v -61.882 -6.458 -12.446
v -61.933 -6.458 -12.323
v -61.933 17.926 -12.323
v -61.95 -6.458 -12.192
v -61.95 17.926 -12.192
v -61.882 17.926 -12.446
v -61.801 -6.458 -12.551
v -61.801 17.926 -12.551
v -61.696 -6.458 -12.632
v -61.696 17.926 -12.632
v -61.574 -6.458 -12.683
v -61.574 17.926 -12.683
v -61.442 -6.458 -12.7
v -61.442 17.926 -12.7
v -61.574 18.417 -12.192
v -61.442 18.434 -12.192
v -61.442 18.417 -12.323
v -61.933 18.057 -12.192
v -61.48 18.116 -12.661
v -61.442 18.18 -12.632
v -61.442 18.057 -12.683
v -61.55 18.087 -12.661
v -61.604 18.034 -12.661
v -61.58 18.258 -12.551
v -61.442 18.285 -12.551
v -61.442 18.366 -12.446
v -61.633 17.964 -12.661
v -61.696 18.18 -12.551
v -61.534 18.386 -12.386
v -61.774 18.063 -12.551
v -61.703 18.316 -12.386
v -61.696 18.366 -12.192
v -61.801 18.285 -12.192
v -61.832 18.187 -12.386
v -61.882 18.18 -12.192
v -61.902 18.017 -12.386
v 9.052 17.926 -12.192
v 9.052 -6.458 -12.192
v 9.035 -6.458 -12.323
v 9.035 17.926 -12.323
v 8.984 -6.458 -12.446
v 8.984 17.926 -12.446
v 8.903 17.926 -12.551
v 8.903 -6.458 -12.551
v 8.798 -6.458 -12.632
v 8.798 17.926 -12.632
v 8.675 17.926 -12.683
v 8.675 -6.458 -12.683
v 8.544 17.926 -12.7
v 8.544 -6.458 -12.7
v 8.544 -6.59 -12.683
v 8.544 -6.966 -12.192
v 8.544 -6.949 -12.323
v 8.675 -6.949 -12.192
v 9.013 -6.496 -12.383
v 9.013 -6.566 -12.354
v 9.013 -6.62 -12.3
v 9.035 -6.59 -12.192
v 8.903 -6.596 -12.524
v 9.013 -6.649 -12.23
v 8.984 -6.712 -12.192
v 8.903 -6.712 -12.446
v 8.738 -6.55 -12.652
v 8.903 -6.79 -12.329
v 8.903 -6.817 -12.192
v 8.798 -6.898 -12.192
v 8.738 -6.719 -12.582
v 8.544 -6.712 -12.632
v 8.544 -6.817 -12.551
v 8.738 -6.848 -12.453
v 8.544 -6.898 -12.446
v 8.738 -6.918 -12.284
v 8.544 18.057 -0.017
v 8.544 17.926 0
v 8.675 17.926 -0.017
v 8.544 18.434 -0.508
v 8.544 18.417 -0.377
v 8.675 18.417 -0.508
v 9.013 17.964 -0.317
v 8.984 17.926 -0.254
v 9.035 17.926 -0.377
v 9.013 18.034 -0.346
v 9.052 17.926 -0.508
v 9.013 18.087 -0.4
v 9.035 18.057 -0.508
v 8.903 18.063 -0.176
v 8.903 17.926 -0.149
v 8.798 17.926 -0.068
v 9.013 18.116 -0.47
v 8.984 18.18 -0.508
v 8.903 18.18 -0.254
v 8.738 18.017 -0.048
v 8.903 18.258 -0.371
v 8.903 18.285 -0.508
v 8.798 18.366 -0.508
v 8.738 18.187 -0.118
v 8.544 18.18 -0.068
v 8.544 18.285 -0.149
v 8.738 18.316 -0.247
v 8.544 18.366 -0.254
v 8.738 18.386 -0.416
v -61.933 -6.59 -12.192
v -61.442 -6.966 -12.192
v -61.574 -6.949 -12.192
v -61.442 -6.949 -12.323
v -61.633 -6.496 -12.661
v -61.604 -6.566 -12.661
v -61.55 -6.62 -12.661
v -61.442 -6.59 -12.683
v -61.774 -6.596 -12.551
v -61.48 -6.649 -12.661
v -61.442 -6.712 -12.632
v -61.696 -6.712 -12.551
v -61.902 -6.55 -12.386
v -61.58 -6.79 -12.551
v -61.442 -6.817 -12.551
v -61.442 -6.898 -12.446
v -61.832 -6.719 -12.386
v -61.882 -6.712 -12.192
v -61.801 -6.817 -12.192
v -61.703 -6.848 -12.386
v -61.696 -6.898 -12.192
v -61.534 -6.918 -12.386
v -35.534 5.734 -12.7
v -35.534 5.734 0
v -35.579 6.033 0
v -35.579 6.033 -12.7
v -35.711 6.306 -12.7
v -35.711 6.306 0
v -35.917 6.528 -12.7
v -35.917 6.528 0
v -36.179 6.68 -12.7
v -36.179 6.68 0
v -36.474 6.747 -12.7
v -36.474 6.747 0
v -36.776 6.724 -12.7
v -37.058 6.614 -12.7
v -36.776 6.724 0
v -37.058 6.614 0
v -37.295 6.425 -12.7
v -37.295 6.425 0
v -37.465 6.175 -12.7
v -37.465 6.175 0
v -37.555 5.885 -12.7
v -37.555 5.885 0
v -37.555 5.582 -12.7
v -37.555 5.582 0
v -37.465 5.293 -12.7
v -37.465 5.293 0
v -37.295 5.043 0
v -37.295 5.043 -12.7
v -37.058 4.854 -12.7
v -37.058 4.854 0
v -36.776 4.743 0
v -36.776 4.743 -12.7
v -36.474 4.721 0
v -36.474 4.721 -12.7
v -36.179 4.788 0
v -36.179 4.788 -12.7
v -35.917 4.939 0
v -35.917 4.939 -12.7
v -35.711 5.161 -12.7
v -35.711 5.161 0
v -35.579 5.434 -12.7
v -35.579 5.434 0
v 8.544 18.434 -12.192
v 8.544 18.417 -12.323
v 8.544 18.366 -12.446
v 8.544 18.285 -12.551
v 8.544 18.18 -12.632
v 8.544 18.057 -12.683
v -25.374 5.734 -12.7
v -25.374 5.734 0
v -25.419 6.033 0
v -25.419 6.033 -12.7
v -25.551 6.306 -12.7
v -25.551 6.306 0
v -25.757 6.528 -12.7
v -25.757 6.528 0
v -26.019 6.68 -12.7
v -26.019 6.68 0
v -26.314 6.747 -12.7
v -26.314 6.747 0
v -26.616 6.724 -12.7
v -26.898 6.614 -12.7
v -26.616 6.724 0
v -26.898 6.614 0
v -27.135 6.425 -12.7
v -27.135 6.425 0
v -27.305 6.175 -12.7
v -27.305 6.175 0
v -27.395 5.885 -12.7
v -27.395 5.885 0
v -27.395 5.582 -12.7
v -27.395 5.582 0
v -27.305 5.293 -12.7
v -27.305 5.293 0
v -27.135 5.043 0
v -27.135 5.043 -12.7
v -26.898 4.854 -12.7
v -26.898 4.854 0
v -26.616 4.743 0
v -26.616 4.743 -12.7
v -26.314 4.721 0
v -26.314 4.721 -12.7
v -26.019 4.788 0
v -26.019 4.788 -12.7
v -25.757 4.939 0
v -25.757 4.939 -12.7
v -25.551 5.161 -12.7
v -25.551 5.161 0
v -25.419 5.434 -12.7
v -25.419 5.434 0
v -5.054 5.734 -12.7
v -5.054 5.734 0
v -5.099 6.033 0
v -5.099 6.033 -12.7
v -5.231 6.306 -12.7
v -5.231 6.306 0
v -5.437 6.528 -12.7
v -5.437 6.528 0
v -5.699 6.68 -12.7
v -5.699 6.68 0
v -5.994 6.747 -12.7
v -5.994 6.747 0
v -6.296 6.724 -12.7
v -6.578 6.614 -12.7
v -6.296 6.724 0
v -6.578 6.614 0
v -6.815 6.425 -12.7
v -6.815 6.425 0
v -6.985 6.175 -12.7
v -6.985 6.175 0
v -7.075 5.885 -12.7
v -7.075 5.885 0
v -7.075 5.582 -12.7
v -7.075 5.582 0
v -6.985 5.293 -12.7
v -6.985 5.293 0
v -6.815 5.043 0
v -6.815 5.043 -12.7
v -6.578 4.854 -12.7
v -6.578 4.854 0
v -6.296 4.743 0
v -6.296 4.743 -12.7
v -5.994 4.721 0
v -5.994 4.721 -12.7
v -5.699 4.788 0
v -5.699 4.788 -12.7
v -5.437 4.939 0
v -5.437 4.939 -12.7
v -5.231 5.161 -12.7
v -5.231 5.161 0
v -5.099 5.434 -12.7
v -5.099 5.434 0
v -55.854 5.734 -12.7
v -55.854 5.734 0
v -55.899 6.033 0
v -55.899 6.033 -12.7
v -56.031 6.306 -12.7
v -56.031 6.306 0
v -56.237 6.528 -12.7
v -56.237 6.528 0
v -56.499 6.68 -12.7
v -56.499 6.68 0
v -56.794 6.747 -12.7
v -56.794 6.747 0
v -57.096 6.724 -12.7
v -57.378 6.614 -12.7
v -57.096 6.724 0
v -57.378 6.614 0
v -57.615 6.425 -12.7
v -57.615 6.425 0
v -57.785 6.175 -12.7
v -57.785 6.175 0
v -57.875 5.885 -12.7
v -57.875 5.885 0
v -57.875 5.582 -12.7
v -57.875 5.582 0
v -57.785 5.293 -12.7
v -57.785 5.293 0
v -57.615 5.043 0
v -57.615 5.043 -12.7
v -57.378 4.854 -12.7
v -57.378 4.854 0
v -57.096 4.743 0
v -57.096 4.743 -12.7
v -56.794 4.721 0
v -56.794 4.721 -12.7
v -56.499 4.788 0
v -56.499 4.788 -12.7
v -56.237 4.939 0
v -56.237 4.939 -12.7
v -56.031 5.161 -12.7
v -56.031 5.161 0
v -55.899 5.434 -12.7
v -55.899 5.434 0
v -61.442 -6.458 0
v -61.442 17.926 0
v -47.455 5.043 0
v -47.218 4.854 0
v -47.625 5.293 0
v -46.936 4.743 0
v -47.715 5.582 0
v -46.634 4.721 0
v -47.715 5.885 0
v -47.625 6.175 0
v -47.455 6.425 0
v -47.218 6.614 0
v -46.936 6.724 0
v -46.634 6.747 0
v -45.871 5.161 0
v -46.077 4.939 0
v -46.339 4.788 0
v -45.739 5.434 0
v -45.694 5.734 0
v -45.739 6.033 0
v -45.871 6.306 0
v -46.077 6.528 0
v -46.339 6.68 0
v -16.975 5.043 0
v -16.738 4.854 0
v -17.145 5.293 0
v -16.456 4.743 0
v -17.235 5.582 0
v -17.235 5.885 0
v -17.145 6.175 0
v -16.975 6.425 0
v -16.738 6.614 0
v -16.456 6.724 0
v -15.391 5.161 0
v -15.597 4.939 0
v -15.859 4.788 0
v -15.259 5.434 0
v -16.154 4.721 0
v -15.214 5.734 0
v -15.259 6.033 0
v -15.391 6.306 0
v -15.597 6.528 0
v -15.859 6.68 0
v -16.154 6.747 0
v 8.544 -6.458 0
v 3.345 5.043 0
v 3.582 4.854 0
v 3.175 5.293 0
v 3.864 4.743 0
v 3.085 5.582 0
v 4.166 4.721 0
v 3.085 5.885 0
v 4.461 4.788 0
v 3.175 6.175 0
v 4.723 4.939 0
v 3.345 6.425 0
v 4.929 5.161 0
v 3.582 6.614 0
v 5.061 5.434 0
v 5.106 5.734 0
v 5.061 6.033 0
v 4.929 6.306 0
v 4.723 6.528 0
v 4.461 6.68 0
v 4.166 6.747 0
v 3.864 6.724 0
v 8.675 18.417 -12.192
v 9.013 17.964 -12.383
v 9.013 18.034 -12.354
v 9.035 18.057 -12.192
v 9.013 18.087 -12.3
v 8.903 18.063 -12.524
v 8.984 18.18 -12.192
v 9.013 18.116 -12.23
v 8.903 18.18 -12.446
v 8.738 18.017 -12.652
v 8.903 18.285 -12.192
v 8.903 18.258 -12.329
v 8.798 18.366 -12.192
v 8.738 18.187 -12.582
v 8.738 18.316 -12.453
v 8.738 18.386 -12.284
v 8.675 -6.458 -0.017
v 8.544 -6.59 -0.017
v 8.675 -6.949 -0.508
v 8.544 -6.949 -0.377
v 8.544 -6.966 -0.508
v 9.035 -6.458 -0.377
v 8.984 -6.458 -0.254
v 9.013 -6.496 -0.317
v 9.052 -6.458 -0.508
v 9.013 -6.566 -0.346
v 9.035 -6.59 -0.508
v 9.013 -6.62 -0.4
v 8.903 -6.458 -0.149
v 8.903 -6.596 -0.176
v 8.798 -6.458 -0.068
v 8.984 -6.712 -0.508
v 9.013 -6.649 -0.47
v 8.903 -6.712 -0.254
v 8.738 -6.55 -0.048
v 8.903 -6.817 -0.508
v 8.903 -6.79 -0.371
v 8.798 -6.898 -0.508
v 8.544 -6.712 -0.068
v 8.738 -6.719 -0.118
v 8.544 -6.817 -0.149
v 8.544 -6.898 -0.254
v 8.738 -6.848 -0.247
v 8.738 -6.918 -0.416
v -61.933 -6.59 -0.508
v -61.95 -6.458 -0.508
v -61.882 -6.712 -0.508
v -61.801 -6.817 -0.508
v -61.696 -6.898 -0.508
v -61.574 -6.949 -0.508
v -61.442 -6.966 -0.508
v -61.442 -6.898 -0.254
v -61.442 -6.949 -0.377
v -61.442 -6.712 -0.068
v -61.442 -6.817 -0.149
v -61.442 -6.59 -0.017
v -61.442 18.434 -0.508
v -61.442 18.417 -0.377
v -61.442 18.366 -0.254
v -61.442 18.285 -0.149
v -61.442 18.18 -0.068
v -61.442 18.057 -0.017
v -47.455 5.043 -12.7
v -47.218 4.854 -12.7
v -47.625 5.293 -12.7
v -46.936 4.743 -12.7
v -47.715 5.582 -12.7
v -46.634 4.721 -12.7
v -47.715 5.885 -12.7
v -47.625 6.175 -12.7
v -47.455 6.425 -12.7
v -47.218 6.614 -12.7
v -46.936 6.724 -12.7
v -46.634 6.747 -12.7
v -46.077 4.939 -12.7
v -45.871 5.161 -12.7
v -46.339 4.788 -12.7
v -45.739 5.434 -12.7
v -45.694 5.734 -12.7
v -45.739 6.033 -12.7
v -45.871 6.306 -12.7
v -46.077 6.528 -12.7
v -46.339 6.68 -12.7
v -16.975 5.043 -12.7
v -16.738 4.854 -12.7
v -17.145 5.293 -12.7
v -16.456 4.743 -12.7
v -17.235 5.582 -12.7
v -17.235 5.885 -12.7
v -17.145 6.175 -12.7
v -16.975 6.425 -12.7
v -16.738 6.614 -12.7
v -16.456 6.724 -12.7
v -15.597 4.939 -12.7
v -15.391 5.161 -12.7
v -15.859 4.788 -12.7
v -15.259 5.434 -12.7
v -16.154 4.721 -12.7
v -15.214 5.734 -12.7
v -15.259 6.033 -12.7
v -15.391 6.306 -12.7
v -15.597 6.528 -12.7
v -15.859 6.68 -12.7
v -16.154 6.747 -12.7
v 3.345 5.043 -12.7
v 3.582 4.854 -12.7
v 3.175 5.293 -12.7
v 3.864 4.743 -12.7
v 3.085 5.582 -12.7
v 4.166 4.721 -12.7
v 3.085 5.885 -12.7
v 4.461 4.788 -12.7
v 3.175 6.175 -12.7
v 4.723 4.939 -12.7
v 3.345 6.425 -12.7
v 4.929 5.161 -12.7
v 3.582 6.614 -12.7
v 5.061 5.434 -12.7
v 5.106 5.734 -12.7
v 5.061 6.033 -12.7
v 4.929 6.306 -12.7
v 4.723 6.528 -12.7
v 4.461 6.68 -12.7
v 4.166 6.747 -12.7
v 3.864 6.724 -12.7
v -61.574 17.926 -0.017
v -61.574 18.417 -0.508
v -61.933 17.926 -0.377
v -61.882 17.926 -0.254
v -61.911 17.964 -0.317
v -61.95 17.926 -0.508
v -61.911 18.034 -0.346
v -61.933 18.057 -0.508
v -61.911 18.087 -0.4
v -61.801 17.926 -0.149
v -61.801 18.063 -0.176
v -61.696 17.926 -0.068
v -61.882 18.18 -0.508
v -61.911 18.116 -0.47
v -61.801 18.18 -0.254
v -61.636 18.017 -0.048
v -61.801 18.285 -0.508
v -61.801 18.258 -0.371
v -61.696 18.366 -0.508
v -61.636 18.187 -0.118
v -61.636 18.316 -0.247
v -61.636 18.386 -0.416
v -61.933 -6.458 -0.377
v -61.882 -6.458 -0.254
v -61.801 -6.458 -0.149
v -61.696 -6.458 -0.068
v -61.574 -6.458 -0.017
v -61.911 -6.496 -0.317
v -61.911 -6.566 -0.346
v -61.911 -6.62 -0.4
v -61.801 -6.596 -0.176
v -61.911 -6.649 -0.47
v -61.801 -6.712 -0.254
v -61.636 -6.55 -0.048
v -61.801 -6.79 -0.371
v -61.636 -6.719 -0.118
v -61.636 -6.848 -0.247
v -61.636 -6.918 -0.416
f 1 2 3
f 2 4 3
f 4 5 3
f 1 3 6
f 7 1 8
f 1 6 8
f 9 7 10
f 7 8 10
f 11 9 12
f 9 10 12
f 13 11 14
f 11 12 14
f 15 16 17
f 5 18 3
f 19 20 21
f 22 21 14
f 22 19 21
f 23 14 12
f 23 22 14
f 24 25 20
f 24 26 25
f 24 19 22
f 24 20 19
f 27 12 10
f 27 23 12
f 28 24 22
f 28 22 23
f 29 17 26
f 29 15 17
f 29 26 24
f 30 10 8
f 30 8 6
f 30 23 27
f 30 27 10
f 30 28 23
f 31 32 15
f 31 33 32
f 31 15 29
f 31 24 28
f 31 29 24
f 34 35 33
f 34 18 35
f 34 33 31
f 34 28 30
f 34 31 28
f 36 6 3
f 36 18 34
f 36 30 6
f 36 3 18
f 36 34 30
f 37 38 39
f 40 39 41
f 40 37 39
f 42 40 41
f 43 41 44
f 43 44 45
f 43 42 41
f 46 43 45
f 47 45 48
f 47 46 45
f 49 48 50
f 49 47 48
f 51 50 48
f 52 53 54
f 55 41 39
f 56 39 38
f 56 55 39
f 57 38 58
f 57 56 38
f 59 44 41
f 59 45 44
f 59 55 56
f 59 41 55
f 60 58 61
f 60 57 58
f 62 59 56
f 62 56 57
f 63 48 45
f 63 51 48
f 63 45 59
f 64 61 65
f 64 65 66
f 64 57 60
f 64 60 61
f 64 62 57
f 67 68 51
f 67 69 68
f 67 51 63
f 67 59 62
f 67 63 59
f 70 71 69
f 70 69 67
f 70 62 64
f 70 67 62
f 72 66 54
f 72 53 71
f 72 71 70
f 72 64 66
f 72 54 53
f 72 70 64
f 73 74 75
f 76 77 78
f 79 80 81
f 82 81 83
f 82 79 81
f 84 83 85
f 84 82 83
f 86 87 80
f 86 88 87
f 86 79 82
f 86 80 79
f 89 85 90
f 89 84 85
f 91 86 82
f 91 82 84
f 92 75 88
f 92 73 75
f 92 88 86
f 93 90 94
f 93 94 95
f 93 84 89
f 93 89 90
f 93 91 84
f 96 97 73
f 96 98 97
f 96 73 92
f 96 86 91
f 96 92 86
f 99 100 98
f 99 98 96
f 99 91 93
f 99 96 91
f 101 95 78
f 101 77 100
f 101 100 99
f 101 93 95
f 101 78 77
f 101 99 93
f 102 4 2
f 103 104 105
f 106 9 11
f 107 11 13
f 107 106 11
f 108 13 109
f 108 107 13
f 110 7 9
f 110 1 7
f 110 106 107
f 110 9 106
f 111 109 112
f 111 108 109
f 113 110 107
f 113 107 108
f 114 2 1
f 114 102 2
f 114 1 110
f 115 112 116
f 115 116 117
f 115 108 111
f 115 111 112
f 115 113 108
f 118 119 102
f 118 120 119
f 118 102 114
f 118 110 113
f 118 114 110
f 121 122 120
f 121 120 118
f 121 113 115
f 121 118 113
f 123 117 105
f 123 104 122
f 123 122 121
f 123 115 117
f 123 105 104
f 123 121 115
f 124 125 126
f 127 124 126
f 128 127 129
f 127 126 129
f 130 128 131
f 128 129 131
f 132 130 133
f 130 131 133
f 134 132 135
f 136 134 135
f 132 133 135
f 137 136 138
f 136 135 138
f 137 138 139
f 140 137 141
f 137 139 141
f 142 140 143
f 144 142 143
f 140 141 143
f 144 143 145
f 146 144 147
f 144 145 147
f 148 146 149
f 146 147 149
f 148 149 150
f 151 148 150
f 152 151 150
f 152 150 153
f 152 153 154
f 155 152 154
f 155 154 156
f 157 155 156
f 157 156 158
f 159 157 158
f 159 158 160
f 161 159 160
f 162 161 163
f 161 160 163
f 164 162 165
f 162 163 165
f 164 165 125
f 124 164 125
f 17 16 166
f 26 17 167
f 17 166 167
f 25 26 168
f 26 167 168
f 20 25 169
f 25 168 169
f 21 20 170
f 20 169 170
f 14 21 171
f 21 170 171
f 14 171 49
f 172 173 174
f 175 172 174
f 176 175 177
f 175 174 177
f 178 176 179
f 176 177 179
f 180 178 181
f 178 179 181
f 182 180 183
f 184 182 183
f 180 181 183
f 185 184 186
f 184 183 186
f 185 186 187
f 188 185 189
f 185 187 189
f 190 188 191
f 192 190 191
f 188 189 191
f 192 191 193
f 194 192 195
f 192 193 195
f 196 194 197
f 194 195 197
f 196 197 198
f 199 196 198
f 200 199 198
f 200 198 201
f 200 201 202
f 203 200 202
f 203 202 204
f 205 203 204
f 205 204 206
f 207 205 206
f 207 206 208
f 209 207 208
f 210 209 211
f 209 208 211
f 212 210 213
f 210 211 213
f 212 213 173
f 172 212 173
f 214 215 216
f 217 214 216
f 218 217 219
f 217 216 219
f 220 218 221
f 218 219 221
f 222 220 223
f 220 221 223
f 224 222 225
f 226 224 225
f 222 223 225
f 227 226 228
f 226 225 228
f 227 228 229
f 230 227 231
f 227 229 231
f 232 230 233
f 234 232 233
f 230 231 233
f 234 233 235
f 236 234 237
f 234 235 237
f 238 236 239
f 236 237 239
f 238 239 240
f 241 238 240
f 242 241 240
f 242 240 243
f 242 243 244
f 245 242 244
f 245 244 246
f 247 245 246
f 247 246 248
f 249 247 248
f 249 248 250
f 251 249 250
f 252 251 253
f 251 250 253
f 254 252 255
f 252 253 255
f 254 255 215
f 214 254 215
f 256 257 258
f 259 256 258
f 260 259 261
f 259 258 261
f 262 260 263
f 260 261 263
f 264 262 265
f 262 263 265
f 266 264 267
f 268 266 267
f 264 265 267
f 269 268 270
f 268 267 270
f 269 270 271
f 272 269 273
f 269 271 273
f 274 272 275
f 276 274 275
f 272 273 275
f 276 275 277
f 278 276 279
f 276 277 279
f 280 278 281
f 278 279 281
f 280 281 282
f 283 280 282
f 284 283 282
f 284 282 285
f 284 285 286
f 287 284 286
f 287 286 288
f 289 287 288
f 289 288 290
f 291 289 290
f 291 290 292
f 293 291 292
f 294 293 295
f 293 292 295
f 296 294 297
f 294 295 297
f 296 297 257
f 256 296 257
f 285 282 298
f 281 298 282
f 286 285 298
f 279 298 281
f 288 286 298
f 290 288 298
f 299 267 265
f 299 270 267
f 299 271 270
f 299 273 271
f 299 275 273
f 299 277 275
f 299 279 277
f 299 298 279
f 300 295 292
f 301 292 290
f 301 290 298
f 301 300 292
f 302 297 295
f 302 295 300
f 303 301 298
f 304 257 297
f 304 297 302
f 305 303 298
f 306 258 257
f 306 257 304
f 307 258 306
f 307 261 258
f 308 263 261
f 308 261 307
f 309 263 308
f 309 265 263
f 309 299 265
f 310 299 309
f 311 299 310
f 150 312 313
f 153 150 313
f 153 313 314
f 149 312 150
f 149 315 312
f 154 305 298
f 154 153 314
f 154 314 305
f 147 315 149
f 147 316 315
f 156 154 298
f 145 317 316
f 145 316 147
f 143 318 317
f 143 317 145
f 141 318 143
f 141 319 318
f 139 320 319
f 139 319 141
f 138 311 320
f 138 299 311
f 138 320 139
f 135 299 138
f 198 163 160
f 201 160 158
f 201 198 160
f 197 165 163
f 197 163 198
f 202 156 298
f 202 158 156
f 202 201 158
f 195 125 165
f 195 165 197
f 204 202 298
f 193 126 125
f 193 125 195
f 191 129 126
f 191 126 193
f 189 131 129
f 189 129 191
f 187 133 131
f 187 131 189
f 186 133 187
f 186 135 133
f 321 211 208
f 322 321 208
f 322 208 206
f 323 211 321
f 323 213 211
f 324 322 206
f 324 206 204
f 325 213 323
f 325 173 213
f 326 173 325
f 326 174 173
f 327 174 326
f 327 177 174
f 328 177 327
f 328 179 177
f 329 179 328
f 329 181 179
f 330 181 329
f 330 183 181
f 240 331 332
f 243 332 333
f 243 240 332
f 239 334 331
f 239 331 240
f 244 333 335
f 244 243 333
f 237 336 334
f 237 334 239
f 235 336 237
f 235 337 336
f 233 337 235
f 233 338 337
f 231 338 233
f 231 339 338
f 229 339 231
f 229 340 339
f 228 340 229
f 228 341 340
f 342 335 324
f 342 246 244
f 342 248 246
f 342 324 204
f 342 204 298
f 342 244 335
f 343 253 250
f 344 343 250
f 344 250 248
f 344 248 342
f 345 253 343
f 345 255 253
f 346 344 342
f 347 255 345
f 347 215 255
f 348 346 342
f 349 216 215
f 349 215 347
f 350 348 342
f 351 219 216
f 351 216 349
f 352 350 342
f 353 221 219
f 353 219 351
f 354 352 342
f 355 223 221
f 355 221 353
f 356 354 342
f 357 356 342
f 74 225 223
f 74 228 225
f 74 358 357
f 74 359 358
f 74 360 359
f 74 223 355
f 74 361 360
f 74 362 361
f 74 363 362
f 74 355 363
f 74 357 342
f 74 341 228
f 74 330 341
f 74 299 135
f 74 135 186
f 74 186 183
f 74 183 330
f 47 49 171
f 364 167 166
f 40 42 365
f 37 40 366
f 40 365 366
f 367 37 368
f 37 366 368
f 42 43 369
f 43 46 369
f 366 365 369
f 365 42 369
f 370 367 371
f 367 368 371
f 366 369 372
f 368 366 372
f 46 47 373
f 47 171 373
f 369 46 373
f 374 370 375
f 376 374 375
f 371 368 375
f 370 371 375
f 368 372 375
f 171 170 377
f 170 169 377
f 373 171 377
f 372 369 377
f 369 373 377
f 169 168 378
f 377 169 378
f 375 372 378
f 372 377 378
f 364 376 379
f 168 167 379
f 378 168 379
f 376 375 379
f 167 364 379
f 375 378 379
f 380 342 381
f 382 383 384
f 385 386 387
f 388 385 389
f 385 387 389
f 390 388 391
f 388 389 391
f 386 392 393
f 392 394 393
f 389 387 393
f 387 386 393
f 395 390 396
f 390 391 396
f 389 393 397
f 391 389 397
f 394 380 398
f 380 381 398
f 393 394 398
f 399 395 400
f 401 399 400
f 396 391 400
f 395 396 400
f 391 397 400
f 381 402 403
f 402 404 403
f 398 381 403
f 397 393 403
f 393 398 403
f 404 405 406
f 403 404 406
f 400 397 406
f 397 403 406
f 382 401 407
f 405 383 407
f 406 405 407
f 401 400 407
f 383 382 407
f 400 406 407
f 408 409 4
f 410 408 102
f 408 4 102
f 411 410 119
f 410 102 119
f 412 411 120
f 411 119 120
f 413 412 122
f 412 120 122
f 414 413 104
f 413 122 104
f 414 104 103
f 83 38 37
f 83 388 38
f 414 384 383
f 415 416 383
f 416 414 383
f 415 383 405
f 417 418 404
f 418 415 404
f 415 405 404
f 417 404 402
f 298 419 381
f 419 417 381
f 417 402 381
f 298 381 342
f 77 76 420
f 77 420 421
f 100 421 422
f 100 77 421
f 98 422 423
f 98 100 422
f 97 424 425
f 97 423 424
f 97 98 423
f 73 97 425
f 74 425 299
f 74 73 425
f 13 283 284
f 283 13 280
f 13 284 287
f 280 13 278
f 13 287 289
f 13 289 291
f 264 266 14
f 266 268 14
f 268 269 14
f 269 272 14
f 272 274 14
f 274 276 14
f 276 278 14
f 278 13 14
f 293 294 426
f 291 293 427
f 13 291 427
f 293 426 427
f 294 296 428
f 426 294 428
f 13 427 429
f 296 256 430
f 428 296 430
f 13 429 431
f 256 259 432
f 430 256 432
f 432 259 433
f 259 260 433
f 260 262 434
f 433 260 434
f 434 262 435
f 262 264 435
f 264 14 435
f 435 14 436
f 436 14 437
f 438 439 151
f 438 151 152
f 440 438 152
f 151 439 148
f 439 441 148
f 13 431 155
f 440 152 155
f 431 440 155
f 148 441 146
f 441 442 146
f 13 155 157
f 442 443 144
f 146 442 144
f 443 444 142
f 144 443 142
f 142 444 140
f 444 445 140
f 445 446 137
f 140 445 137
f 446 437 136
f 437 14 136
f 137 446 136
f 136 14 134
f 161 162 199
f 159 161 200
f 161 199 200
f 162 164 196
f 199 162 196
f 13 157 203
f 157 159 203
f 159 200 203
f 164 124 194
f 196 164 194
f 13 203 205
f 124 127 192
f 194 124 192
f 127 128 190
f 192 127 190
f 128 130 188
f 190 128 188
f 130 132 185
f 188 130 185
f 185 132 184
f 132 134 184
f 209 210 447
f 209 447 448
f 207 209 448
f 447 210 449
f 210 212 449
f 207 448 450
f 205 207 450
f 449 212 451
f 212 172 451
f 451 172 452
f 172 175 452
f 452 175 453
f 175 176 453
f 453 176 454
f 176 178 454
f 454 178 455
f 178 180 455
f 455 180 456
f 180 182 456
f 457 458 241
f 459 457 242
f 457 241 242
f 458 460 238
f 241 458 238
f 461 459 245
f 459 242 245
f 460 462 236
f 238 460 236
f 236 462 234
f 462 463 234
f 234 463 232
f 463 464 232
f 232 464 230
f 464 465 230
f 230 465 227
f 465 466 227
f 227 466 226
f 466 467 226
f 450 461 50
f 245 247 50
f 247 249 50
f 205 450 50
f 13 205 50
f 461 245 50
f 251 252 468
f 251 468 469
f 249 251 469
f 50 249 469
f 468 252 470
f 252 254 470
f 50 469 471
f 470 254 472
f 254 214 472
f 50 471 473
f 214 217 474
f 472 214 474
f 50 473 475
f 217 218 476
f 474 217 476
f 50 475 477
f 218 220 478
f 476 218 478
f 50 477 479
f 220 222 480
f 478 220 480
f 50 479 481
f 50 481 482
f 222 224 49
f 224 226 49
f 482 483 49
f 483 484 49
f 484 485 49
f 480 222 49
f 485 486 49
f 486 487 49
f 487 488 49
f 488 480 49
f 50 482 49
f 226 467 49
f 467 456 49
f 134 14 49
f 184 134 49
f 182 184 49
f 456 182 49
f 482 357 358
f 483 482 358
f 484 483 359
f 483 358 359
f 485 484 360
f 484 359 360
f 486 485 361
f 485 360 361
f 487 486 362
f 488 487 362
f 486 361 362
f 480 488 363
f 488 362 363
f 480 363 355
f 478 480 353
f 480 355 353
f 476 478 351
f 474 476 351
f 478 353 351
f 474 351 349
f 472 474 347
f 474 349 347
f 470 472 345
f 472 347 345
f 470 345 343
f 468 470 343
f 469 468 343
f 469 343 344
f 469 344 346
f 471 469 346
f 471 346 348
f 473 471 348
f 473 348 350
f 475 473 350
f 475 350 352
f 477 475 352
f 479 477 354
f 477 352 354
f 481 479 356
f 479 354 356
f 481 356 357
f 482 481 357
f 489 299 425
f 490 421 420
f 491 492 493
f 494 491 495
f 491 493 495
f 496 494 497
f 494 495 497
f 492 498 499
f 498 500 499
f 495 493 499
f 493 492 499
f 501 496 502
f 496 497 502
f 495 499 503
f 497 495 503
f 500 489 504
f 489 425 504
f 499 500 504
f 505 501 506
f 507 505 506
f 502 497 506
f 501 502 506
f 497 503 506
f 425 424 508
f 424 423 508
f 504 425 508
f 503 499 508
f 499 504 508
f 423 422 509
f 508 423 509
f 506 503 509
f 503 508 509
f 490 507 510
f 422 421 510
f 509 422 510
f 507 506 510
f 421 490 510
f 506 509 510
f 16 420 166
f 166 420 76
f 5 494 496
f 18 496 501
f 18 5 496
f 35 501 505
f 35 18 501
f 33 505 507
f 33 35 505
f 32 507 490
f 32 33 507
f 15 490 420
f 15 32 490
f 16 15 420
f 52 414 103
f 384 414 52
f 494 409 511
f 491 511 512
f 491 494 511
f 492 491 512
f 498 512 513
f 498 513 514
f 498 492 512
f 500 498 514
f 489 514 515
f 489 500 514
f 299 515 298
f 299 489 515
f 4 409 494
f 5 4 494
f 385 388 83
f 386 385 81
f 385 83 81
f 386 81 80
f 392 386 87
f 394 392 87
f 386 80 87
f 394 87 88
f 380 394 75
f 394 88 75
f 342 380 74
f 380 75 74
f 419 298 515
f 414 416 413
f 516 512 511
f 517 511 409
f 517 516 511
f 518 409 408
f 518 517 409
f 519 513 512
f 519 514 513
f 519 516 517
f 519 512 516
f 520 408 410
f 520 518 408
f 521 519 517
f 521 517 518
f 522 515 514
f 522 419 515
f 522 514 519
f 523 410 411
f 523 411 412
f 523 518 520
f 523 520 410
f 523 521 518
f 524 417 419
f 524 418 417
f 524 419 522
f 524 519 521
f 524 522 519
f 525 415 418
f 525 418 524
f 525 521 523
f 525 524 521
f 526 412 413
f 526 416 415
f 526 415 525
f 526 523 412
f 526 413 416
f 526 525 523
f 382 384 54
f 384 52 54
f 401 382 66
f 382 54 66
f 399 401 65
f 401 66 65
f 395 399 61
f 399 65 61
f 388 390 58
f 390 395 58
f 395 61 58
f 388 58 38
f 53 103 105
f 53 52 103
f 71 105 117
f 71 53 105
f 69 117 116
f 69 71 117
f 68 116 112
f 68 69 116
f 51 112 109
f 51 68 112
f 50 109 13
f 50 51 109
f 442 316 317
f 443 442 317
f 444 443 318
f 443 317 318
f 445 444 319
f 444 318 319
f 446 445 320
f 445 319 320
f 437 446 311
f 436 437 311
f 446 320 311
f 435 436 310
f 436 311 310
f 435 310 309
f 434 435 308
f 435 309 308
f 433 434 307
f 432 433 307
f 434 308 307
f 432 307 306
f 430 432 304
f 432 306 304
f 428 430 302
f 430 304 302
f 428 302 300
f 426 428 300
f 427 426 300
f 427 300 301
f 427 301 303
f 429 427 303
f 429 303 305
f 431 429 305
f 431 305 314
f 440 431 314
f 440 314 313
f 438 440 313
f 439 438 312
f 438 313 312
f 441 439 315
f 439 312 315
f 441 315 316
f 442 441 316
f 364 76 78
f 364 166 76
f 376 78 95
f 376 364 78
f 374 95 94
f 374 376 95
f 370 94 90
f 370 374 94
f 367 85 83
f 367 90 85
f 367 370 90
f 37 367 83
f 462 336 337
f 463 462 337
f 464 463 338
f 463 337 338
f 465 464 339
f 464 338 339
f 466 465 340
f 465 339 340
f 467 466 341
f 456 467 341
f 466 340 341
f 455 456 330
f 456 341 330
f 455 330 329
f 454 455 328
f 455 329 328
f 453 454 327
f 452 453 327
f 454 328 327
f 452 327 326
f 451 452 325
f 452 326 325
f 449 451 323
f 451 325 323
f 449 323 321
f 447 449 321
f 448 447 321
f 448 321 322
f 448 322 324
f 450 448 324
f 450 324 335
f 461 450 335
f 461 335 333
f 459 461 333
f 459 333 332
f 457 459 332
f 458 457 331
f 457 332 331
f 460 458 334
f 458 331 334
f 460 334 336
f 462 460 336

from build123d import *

# Parameters (mm, degrees)
F0_W     = 71.0019436256
F0_H     = 25.4
F0_R     = 1.016
F1_DEPTH = 12.7
F2_R     = 0.508


# Not quite as in the source:
# - a feature names something its author has since deleted; it is built from what else it names


with BuildPart() as f1:
    # F0 (on Top) → F1 (new body)
    with BuildSketch(Plane.XY):
        with Locations((-26.4490794038, 5.7338142046)):
            Rectangle(F0_W, F0_H)
        with Locations((-56.8700512166, 5.7338142046)):
            Circle(F0_R, mode=Mode.SUBTRACT)
        with Locations((-46.7100512166, 5.7338142046)):
            Circle(F0_R, mode=Mode.SUBTRACT)
        with Locations((-36.5500512166, 5.7338142046)):
            Circle(F0_R, mode=Mode.SUBTRACT)
        with Locations((-26.3900512166, 5.7338142046)):
            Circle(F0_R, mode=Mode.SUBTRACT)
        with Locations((-16.2300512166, 5.7338142046)):
            Circle(F0_R, mode=Mode.SUBTRACT)
        with Locations((-6.0700512166, 5.7338142046)):
            Circle(F0_R, mode=Mode.SUBTRACT)
        with Locations((4.0899487834, 5.7338142046)):
            Circle(F0_R, mode=Mode.SUBTRACT)
    extrude(amount=-F1_DEPTH)

    # F2
    f2_edges = [f1.edges().sort_by_distance(p)[0] for p in [
        (-26.449079, 18.433814, 0),
        (-26.449079, -6.966186, 0),
        (-61.950051, 5.733814, 0),
        (-61.950051, -6.966186, -6.35),
        (-61.950051, 18.433814, -6.35),
        (-26.449079, 18.433814, -12.7),
        (-61.950051, 5.733814, -12.7),
        (-26.449079, -6.966186, -12.7),
        (9.051892, 5.733814, -12.7),
        (9.051892, 5.733814, 0),
        (9.051892, 18.433814, -6.35),
        (9.051892, -6.966186, -6.35),
    ]]
    fillet(f2_edges, radius=F2_R)


solid = f1.part
